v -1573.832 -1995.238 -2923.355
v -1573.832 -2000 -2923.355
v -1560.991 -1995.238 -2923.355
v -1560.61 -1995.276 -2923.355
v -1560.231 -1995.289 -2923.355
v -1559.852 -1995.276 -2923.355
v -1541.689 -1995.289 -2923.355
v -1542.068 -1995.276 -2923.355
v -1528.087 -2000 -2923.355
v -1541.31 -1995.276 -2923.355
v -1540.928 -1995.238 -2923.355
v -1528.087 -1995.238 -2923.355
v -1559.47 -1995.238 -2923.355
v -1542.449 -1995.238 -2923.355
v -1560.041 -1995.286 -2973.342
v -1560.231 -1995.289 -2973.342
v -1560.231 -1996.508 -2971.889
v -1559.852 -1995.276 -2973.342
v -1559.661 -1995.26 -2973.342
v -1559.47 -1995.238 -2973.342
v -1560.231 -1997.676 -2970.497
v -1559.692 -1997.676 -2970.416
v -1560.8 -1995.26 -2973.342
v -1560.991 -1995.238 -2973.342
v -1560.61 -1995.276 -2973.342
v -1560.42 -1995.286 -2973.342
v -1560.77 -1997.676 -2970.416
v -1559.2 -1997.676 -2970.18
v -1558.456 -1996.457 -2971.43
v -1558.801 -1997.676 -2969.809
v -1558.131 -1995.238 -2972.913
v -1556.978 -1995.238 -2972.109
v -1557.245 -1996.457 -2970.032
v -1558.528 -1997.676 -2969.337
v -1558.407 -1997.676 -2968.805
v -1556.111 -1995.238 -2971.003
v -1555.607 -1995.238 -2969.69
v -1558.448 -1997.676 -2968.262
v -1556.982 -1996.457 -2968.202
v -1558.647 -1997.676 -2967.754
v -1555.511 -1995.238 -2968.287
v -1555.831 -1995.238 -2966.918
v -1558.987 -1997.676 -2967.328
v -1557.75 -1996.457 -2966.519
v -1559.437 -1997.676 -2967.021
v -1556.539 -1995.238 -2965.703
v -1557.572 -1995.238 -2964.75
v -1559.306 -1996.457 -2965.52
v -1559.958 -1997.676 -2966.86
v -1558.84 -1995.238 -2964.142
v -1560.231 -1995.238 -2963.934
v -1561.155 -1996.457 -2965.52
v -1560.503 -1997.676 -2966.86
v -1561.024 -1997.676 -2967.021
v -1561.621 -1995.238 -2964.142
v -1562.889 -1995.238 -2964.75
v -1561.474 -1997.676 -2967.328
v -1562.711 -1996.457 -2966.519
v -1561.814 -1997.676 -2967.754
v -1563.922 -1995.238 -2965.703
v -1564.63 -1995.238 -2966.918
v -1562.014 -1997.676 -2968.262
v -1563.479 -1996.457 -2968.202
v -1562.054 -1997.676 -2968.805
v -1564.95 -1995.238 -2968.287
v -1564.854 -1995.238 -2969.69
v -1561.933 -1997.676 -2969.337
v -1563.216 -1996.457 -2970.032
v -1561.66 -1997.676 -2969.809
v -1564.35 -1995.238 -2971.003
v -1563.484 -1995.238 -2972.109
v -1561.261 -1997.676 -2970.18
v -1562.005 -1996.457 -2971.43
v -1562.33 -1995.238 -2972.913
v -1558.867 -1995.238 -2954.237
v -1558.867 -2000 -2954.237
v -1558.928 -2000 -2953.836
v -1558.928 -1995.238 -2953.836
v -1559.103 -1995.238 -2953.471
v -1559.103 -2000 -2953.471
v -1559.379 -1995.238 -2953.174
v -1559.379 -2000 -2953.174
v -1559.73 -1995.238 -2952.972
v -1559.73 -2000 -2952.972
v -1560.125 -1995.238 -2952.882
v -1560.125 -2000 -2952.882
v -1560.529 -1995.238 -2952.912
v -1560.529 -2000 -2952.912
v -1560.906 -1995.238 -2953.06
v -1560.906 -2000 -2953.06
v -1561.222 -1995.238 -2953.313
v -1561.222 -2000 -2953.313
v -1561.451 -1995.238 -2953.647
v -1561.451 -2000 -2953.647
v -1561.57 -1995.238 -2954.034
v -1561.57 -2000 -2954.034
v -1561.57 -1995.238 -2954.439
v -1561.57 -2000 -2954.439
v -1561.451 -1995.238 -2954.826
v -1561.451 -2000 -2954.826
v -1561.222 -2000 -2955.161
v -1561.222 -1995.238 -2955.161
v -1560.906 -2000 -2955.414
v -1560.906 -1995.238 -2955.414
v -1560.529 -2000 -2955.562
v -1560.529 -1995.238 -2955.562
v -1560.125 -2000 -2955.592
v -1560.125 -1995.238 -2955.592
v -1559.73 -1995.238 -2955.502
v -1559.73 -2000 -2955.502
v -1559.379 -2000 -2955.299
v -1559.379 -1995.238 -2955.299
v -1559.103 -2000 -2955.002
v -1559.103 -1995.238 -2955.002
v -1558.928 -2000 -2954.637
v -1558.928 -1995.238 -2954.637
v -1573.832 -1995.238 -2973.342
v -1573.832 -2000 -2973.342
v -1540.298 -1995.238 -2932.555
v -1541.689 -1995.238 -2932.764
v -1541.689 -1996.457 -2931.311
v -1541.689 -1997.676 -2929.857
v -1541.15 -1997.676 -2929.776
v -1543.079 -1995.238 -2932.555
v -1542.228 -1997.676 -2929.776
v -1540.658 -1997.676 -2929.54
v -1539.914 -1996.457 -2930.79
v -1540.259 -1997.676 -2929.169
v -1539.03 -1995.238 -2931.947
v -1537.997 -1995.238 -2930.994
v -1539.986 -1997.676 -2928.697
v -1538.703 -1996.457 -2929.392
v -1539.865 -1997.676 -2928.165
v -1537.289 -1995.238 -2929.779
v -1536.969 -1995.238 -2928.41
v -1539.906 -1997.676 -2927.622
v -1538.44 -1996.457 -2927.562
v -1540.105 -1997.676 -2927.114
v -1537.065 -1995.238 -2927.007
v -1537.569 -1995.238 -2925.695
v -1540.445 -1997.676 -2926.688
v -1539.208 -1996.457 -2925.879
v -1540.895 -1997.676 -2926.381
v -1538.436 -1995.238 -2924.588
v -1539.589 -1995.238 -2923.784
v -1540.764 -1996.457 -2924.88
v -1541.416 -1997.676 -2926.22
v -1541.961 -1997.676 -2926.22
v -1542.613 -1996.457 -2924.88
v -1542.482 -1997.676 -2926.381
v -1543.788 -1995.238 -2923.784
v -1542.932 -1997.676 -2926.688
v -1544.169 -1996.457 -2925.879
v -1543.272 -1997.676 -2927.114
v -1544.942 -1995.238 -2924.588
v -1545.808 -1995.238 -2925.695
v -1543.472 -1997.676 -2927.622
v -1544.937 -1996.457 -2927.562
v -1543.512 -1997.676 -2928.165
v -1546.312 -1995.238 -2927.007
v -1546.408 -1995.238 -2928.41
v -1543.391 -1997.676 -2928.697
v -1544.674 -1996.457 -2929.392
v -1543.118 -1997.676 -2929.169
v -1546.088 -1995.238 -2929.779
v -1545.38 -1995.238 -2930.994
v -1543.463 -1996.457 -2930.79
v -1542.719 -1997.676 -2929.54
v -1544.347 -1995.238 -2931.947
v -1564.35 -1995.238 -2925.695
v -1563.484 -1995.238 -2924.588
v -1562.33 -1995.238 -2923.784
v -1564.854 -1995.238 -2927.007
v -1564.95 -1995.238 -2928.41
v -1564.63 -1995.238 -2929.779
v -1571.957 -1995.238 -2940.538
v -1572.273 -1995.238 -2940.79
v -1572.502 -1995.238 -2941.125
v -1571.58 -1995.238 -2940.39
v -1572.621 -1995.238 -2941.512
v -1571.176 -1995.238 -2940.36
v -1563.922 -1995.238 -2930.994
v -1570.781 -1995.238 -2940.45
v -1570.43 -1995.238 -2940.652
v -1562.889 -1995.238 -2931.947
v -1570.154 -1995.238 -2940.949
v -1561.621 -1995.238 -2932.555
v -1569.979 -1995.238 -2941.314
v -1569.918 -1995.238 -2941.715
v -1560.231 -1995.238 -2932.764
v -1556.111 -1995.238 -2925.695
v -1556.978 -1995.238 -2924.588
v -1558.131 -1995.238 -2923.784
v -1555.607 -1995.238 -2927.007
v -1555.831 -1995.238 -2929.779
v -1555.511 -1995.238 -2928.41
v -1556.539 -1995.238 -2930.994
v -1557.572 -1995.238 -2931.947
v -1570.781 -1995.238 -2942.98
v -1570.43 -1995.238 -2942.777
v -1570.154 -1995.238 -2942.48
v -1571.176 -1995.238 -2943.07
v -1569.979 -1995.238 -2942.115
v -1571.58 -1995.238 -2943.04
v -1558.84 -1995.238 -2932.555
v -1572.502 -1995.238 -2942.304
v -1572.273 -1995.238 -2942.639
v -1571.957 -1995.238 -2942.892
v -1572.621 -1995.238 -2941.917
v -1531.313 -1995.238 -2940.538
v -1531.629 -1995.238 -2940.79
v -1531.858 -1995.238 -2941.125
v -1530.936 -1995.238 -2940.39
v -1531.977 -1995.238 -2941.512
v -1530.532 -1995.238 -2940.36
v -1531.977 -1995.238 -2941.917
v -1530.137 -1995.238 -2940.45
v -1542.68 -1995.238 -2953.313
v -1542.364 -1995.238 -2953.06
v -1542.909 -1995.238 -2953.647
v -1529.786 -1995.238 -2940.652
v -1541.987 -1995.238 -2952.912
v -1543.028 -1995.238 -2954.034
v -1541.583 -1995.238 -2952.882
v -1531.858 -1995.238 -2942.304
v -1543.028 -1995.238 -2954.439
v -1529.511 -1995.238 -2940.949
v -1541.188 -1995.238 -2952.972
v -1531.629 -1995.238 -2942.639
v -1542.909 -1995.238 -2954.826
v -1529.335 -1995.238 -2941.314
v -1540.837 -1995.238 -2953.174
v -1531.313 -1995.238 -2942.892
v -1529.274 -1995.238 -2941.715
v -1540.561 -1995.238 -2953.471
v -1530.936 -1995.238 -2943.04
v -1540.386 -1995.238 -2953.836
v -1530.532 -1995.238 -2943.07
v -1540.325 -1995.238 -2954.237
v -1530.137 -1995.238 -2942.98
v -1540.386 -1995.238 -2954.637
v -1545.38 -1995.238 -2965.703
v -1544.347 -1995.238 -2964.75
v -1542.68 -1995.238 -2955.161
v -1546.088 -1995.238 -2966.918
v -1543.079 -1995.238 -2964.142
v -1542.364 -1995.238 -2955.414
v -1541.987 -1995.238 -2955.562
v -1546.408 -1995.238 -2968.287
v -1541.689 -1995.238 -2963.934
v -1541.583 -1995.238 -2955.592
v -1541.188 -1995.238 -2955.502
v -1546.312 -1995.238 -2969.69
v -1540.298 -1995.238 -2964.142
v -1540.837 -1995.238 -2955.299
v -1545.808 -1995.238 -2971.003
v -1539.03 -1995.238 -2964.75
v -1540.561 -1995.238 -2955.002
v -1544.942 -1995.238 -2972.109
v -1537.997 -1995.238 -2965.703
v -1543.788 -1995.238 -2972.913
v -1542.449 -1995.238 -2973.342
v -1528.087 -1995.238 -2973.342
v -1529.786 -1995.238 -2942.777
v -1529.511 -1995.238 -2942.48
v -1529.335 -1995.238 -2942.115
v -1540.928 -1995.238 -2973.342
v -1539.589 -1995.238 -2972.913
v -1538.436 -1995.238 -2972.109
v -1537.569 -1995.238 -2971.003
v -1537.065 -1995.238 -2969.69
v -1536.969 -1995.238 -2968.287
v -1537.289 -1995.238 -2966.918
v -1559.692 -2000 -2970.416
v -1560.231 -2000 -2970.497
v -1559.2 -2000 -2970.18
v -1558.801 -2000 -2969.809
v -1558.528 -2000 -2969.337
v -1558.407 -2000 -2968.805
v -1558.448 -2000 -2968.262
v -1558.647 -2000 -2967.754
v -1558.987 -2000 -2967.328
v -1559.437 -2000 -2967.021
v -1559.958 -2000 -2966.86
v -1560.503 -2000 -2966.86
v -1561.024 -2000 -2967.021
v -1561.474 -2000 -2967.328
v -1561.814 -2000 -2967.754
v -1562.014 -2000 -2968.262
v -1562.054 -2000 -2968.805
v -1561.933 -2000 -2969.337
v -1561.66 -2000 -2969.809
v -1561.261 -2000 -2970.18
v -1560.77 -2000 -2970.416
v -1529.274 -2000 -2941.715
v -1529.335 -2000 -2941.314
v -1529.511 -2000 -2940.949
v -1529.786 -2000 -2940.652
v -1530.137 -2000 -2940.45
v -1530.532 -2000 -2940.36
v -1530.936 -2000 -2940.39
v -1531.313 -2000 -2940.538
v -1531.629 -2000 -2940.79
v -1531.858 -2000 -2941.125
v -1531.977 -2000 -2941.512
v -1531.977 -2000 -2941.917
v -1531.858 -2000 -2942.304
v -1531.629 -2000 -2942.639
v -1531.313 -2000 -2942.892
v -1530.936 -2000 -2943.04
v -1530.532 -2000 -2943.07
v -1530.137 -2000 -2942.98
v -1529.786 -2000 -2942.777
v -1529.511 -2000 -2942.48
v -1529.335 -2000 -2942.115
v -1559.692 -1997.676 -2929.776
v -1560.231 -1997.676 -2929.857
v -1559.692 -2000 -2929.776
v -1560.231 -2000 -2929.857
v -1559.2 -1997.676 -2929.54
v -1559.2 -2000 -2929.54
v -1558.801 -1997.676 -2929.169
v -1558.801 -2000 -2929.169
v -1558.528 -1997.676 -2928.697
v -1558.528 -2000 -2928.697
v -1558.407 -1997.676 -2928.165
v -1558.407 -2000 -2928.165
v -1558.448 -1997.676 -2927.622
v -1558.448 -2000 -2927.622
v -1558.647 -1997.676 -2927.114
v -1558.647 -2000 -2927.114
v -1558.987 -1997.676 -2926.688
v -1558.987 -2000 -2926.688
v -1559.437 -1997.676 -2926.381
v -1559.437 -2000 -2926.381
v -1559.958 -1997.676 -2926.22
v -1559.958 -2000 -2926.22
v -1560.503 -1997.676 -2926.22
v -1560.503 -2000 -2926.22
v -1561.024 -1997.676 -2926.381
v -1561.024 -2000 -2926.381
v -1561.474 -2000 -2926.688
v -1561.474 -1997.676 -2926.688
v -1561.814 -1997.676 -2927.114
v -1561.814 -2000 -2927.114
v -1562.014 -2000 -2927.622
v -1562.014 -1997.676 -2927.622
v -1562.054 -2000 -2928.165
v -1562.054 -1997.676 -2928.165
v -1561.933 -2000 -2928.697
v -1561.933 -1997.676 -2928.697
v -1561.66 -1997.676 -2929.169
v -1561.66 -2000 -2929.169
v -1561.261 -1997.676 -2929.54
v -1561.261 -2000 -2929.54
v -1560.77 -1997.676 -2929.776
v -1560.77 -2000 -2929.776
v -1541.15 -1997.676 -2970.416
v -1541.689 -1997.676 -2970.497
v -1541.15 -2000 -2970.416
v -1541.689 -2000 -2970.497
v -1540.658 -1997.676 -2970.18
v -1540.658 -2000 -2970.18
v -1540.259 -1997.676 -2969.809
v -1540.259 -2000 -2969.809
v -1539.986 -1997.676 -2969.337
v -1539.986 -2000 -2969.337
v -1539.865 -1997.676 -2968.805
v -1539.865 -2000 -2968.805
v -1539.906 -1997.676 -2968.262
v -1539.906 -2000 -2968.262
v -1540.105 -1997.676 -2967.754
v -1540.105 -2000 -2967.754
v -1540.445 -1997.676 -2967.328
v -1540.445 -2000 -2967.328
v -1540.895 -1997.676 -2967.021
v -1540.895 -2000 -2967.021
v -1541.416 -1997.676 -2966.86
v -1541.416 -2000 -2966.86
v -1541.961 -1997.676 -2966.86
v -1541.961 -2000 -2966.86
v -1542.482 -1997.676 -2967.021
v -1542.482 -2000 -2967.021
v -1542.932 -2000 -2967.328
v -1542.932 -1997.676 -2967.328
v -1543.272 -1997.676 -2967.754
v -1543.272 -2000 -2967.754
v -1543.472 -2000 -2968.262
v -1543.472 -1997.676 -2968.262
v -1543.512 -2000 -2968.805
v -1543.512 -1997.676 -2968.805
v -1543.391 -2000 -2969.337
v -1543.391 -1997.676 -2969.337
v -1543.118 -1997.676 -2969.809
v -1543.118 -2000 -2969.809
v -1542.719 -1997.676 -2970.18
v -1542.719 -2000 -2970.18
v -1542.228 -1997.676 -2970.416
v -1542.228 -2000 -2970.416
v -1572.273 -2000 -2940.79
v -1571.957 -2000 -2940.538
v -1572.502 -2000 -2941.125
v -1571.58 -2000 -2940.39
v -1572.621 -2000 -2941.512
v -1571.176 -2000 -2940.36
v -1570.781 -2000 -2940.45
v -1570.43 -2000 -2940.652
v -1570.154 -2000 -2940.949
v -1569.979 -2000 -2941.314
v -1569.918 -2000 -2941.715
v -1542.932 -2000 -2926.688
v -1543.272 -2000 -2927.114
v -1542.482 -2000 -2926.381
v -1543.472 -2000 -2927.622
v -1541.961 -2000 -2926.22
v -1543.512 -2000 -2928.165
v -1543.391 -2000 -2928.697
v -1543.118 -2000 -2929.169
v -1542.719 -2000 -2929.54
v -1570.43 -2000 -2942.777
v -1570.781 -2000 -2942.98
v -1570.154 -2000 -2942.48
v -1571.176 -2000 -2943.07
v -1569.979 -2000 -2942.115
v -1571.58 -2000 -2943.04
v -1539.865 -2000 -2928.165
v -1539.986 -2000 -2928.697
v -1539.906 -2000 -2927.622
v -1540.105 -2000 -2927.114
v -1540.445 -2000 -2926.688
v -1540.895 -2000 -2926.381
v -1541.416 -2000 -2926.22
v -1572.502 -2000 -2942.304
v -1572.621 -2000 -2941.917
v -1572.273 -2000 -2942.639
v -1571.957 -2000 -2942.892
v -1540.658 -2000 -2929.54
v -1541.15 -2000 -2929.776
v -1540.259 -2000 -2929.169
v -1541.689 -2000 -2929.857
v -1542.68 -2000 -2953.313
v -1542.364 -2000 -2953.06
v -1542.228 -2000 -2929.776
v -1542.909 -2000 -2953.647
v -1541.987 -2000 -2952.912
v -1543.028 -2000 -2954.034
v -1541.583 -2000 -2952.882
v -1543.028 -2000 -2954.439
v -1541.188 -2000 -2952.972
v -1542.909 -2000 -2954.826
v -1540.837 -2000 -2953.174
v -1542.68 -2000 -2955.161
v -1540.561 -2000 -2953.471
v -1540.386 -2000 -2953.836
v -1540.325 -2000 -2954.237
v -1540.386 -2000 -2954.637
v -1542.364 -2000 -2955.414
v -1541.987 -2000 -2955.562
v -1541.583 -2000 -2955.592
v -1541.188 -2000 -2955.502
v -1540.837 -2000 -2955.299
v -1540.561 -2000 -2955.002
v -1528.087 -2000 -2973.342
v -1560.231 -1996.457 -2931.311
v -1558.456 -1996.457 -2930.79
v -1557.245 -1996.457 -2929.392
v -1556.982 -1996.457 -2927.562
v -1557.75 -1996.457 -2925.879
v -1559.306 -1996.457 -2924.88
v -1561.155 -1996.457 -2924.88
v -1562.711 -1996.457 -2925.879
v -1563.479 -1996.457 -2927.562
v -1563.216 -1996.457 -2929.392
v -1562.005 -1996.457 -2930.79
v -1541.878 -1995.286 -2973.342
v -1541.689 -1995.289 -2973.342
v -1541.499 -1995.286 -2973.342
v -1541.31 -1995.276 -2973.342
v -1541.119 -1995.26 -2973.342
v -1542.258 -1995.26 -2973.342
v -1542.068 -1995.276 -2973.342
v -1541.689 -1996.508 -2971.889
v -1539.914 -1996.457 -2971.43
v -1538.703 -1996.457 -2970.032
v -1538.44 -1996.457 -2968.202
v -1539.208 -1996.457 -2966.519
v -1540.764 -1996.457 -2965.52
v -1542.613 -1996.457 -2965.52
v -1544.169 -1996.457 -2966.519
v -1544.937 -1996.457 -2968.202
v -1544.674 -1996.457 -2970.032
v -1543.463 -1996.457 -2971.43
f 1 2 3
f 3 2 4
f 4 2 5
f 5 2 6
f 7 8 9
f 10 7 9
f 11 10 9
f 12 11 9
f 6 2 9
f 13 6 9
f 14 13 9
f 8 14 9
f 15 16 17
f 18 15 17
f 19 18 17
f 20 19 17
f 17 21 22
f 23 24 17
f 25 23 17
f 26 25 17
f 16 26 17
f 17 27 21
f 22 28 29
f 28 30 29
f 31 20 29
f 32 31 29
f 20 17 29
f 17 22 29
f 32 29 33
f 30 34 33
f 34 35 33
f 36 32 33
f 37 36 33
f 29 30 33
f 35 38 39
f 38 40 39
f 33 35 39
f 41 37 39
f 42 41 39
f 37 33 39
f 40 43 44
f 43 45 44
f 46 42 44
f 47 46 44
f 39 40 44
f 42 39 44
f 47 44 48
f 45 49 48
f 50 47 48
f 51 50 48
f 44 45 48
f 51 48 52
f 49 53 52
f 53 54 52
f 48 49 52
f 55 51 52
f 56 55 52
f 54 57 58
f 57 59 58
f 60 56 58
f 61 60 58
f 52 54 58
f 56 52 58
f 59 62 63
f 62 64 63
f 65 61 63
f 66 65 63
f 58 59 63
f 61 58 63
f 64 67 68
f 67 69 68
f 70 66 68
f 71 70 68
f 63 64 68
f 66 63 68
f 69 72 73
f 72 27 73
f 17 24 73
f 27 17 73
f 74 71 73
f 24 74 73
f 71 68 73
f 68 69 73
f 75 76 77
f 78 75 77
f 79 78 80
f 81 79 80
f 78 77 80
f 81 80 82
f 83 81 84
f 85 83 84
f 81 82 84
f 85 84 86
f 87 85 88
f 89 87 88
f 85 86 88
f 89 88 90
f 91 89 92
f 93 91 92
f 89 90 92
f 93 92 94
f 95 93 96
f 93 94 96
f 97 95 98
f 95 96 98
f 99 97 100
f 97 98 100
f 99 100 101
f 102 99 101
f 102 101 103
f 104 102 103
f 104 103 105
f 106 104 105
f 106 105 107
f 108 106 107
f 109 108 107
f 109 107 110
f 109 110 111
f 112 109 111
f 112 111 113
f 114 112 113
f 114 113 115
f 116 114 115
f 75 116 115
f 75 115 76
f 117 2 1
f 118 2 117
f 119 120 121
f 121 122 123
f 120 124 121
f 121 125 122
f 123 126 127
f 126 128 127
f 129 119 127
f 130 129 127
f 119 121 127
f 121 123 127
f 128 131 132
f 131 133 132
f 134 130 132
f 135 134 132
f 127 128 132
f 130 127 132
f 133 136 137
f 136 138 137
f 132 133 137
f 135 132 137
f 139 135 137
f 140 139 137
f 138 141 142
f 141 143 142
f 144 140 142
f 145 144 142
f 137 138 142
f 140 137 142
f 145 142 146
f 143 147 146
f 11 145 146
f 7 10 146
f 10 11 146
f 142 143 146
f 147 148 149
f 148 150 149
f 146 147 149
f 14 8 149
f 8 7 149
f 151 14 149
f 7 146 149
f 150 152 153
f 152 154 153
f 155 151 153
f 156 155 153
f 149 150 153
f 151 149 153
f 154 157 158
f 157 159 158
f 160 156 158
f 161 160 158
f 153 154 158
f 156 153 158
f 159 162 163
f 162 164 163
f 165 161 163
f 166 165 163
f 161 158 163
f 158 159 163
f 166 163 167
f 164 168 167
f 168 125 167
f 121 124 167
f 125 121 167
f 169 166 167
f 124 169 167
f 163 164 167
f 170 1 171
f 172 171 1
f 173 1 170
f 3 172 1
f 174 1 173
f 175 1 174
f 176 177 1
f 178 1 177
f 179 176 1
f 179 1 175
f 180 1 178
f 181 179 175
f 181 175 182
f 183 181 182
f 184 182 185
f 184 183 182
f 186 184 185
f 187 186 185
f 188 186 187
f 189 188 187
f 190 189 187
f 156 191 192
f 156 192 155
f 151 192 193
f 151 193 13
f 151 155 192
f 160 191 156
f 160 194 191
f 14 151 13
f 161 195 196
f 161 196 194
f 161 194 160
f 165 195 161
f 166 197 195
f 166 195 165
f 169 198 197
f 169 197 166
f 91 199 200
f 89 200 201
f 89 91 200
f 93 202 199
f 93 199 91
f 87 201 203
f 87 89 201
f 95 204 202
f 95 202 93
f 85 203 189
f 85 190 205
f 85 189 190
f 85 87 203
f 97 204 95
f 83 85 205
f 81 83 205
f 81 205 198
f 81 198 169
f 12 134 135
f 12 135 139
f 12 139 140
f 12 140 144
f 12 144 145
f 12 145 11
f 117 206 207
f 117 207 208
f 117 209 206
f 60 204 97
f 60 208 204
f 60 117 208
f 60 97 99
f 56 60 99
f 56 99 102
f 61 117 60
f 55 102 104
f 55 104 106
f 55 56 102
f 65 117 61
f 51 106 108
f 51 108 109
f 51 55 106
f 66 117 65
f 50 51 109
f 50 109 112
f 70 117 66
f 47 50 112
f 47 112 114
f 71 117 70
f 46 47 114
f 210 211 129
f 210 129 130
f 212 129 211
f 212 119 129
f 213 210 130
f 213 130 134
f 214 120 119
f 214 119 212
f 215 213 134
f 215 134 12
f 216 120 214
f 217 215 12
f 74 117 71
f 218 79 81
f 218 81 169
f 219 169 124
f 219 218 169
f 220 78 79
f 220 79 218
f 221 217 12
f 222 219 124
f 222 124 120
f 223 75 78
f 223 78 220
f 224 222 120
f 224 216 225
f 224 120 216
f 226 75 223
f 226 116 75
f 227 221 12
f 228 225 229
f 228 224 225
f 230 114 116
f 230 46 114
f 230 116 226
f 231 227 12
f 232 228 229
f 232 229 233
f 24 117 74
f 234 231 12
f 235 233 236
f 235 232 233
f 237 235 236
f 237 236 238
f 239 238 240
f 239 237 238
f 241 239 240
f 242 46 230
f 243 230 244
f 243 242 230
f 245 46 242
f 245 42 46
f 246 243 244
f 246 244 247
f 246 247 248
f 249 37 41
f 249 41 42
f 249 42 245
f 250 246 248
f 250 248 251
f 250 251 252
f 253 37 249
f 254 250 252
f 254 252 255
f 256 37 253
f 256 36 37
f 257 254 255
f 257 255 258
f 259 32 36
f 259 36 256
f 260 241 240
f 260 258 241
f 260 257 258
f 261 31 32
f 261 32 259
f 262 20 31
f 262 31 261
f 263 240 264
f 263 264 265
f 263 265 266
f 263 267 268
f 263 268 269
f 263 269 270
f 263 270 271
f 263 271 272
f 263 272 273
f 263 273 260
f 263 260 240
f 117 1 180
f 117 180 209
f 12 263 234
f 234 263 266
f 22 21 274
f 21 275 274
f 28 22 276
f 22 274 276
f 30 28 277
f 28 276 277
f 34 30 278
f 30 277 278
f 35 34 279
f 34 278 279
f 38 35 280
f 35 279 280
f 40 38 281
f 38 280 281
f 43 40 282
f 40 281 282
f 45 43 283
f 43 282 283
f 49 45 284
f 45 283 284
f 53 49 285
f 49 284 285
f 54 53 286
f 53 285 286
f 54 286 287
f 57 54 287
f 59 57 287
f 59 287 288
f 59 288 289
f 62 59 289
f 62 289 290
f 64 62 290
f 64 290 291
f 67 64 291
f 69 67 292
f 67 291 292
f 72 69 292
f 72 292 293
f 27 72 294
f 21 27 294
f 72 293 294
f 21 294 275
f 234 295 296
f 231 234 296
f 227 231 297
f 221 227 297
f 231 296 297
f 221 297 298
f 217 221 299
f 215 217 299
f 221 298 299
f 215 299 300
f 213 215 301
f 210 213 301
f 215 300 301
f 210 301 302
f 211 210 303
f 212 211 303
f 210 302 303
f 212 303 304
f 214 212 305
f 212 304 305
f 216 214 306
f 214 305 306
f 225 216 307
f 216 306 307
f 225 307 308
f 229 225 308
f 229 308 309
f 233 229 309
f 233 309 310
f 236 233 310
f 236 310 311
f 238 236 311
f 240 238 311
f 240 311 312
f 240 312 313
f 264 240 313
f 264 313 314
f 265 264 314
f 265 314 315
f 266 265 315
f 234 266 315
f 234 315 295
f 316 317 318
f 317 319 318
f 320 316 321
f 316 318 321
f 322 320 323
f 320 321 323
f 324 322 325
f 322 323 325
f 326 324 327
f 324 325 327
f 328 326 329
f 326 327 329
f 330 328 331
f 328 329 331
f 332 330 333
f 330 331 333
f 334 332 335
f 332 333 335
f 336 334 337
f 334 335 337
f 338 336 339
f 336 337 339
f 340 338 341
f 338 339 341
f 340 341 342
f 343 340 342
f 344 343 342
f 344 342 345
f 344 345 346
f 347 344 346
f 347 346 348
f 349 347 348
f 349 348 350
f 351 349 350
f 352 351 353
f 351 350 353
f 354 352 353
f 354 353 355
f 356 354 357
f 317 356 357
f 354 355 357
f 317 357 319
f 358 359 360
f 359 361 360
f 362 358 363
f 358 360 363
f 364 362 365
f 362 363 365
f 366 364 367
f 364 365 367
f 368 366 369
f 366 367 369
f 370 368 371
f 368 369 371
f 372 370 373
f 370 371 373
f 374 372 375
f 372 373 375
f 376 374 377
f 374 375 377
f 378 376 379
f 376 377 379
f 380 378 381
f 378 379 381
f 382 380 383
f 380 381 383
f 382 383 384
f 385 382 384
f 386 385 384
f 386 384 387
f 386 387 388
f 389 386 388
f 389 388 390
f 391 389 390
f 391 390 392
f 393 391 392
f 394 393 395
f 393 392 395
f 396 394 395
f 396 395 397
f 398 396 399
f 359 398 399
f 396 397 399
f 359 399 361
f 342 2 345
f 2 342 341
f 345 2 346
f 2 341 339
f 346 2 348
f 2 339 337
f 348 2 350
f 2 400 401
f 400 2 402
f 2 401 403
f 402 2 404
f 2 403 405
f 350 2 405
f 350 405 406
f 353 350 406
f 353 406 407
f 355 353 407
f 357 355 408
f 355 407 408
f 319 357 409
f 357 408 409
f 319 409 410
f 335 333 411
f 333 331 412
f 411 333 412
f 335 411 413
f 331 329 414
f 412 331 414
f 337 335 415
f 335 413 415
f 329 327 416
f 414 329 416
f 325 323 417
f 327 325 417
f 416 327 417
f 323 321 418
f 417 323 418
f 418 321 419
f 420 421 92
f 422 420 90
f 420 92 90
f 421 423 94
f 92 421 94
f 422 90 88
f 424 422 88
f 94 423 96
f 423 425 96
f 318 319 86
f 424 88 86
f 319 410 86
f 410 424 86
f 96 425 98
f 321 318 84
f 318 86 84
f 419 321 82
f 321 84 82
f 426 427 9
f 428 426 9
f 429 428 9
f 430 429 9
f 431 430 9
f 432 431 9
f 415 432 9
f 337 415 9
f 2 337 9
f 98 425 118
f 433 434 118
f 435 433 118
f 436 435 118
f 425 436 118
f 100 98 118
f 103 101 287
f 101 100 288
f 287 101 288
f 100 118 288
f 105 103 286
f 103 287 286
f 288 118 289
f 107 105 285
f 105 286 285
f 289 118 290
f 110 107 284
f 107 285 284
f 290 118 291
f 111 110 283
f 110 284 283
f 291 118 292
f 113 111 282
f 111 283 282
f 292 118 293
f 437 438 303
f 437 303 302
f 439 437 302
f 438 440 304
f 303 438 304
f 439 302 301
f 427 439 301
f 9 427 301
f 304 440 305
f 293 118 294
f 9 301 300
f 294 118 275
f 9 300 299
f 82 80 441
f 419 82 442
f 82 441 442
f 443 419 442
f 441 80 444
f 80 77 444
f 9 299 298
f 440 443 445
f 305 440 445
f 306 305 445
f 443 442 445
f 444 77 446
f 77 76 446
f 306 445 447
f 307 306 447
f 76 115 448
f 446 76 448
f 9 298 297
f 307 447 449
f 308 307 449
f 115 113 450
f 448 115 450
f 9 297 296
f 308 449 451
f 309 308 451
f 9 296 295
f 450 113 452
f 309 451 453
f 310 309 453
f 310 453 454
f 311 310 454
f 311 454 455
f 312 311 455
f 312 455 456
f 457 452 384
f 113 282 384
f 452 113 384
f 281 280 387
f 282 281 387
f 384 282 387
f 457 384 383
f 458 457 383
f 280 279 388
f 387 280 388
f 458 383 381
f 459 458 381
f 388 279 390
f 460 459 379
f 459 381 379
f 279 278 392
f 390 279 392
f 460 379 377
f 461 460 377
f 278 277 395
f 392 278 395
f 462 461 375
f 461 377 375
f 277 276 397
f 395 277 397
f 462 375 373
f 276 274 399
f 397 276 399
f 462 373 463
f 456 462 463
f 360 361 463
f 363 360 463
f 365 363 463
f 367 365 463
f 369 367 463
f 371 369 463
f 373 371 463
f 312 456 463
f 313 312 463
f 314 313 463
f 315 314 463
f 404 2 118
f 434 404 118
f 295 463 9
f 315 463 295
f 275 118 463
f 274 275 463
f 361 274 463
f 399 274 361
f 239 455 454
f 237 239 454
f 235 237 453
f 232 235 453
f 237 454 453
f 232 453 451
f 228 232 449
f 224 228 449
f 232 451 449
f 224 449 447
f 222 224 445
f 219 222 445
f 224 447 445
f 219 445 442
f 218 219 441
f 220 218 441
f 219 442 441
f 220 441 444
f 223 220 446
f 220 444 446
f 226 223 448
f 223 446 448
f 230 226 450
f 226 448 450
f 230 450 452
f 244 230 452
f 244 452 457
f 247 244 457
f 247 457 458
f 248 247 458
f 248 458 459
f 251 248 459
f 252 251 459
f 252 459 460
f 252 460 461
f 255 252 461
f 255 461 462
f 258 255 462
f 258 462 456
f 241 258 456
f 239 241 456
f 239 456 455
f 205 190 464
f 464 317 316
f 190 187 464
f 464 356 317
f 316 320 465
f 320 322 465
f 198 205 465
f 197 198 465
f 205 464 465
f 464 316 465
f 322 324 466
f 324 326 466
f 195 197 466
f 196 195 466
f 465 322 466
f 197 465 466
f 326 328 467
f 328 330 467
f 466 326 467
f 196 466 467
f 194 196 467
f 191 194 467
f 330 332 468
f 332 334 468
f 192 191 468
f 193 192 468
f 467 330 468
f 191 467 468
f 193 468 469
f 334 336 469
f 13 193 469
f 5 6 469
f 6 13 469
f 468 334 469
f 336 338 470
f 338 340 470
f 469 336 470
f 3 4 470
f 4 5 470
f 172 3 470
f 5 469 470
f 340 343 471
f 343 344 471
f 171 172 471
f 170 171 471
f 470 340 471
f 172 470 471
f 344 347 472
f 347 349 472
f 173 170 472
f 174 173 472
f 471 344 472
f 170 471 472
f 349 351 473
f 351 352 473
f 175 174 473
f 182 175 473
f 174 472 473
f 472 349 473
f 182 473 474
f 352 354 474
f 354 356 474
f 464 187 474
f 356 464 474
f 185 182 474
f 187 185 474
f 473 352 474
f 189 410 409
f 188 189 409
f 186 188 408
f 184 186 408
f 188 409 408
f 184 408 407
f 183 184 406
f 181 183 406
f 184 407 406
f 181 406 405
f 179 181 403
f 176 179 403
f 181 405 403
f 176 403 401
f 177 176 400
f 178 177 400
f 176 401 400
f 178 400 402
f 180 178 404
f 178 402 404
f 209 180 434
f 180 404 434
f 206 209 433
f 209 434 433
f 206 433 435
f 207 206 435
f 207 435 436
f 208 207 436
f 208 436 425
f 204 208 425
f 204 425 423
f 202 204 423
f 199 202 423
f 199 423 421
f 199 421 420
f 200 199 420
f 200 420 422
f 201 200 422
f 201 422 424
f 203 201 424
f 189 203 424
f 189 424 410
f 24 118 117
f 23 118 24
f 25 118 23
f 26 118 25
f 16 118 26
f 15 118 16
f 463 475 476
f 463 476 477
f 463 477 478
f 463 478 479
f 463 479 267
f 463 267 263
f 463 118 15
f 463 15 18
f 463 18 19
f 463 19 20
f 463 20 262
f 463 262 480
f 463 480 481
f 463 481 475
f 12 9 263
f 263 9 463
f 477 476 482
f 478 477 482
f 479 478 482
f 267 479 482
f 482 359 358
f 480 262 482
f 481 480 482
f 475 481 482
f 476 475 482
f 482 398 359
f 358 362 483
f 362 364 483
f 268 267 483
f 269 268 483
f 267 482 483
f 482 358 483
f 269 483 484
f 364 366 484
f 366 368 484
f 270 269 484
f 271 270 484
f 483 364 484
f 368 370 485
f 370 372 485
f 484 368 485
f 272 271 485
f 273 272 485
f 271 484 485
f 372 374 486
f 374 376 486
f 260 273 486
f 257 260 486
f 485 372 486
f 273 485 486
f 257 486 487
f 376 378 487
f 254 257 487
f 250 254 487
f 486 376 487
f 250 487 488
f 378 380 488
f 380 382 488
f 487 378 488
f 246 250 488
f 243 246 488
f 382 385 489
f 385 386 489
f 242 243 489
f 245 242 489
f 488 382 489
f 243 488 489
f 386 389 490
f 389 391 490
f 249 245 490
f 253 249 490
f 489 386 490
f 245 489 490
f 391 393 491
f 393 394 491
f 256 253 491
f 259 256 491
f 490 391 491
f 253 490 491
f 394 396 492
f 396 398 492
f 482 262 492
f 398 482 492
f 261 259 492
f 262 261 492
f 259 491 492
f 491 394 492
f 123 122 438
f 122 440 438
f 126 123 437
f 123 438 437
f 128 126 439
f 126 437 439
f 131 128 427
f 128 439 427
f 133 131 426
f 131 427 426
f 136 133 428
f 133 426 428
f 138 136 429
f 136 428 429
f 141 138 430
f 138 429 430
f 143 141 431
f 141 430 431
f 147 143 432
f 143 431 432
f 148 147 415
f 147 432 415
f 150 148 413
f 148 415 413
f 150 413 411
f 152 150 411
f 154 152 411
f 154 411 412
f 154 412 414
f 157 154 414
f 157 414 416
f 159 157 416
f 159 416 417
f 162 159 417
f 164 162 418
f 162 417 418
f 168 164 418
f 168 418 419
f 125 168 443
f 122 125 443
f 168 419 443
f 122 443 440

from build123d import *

# Parameters (mm, degrees)
SKETCH1_W                                         = 45.745826238
SKETCH1_H                                         = 49.9872
BOSS_EXTRUDE1_DEPTH                               = 4.7625
CSK_FOR_6_FLAT_HEAD_MACHINE_SCREW_100_D           = 3.6576
CSK_FOR_6_FLAT_HEAD_MACHINE_SCREW_100_CSINK_D     = 9.4701106
CSK_FOR_6_FLAT_HEAD_MACHINE_SCREW_100_CSINK_ANGLE = 100
SKETCH8_R                                         = 1.3589
CUT_EXTRUDE1_DEPTH                                = 5.7625


with BuildPart() as part:
    # Sketch1 → Boss-Extrude1 (new body)
    with BuildSketch(Plane(origin=(0, -2000, 0), x_dir=(1, 0, 0), z_dir=(0, 1, 0))):
        with Locations((-1550.959562055, 2948.348659299)):
            Rectangle(SKETCH1_W, SKETCH1_H)
    extrude(amount=BOSS_EXTRUDE1_DEPTH)

    # CSK for #6 Flat Head Machine Screw (100)8 (through all)
    with Locations(Plane(origin=(-1560.230562055, -1995.2375, -2968.668659299), x_dir=(0, 0, 1), z_dir=(0, 1, 0))):
        with Locations((0, 0), (40.64, 0), (40.64, 18.542), (0, 18.542)):
            CounterSinkHole(CSK_FOR_6_FLAT_HEAD_MACHINE_SCREW_100_D / 2, CSK_FOR_6_FLAT_HEAD_MACHINE_SCREW_100_CSINK_D / 2, counter_sink_angle=CSK_FOR_6_FLAT_HEAD_MACHINE_SCREW_100_CSINK_ANGLE)

    # Sketch8 → Cut-Extrude1 (cut, through all)
    with BuildSketch(Plane.XZ.offset(2000)):
        with Locations((-1541.684253717, -2954.236887357)):
            Circle(SKETCH8_R)
        with Locations((-1560.226253717, -2954.236887357)):
            Circle(SKETCH8_R)
        with Locations((-1571.277192756, -2941.714687357)):
            Circle(SKETCH8_R)
        with Locations((-1530.633314678, -2941.714687357)):
            Circle(SKETCH8_R)
    extrude(amount=-CUT_EXTRUDE1_DEPTH, mode=Mode.SUBTRACT)


solid = part.part
